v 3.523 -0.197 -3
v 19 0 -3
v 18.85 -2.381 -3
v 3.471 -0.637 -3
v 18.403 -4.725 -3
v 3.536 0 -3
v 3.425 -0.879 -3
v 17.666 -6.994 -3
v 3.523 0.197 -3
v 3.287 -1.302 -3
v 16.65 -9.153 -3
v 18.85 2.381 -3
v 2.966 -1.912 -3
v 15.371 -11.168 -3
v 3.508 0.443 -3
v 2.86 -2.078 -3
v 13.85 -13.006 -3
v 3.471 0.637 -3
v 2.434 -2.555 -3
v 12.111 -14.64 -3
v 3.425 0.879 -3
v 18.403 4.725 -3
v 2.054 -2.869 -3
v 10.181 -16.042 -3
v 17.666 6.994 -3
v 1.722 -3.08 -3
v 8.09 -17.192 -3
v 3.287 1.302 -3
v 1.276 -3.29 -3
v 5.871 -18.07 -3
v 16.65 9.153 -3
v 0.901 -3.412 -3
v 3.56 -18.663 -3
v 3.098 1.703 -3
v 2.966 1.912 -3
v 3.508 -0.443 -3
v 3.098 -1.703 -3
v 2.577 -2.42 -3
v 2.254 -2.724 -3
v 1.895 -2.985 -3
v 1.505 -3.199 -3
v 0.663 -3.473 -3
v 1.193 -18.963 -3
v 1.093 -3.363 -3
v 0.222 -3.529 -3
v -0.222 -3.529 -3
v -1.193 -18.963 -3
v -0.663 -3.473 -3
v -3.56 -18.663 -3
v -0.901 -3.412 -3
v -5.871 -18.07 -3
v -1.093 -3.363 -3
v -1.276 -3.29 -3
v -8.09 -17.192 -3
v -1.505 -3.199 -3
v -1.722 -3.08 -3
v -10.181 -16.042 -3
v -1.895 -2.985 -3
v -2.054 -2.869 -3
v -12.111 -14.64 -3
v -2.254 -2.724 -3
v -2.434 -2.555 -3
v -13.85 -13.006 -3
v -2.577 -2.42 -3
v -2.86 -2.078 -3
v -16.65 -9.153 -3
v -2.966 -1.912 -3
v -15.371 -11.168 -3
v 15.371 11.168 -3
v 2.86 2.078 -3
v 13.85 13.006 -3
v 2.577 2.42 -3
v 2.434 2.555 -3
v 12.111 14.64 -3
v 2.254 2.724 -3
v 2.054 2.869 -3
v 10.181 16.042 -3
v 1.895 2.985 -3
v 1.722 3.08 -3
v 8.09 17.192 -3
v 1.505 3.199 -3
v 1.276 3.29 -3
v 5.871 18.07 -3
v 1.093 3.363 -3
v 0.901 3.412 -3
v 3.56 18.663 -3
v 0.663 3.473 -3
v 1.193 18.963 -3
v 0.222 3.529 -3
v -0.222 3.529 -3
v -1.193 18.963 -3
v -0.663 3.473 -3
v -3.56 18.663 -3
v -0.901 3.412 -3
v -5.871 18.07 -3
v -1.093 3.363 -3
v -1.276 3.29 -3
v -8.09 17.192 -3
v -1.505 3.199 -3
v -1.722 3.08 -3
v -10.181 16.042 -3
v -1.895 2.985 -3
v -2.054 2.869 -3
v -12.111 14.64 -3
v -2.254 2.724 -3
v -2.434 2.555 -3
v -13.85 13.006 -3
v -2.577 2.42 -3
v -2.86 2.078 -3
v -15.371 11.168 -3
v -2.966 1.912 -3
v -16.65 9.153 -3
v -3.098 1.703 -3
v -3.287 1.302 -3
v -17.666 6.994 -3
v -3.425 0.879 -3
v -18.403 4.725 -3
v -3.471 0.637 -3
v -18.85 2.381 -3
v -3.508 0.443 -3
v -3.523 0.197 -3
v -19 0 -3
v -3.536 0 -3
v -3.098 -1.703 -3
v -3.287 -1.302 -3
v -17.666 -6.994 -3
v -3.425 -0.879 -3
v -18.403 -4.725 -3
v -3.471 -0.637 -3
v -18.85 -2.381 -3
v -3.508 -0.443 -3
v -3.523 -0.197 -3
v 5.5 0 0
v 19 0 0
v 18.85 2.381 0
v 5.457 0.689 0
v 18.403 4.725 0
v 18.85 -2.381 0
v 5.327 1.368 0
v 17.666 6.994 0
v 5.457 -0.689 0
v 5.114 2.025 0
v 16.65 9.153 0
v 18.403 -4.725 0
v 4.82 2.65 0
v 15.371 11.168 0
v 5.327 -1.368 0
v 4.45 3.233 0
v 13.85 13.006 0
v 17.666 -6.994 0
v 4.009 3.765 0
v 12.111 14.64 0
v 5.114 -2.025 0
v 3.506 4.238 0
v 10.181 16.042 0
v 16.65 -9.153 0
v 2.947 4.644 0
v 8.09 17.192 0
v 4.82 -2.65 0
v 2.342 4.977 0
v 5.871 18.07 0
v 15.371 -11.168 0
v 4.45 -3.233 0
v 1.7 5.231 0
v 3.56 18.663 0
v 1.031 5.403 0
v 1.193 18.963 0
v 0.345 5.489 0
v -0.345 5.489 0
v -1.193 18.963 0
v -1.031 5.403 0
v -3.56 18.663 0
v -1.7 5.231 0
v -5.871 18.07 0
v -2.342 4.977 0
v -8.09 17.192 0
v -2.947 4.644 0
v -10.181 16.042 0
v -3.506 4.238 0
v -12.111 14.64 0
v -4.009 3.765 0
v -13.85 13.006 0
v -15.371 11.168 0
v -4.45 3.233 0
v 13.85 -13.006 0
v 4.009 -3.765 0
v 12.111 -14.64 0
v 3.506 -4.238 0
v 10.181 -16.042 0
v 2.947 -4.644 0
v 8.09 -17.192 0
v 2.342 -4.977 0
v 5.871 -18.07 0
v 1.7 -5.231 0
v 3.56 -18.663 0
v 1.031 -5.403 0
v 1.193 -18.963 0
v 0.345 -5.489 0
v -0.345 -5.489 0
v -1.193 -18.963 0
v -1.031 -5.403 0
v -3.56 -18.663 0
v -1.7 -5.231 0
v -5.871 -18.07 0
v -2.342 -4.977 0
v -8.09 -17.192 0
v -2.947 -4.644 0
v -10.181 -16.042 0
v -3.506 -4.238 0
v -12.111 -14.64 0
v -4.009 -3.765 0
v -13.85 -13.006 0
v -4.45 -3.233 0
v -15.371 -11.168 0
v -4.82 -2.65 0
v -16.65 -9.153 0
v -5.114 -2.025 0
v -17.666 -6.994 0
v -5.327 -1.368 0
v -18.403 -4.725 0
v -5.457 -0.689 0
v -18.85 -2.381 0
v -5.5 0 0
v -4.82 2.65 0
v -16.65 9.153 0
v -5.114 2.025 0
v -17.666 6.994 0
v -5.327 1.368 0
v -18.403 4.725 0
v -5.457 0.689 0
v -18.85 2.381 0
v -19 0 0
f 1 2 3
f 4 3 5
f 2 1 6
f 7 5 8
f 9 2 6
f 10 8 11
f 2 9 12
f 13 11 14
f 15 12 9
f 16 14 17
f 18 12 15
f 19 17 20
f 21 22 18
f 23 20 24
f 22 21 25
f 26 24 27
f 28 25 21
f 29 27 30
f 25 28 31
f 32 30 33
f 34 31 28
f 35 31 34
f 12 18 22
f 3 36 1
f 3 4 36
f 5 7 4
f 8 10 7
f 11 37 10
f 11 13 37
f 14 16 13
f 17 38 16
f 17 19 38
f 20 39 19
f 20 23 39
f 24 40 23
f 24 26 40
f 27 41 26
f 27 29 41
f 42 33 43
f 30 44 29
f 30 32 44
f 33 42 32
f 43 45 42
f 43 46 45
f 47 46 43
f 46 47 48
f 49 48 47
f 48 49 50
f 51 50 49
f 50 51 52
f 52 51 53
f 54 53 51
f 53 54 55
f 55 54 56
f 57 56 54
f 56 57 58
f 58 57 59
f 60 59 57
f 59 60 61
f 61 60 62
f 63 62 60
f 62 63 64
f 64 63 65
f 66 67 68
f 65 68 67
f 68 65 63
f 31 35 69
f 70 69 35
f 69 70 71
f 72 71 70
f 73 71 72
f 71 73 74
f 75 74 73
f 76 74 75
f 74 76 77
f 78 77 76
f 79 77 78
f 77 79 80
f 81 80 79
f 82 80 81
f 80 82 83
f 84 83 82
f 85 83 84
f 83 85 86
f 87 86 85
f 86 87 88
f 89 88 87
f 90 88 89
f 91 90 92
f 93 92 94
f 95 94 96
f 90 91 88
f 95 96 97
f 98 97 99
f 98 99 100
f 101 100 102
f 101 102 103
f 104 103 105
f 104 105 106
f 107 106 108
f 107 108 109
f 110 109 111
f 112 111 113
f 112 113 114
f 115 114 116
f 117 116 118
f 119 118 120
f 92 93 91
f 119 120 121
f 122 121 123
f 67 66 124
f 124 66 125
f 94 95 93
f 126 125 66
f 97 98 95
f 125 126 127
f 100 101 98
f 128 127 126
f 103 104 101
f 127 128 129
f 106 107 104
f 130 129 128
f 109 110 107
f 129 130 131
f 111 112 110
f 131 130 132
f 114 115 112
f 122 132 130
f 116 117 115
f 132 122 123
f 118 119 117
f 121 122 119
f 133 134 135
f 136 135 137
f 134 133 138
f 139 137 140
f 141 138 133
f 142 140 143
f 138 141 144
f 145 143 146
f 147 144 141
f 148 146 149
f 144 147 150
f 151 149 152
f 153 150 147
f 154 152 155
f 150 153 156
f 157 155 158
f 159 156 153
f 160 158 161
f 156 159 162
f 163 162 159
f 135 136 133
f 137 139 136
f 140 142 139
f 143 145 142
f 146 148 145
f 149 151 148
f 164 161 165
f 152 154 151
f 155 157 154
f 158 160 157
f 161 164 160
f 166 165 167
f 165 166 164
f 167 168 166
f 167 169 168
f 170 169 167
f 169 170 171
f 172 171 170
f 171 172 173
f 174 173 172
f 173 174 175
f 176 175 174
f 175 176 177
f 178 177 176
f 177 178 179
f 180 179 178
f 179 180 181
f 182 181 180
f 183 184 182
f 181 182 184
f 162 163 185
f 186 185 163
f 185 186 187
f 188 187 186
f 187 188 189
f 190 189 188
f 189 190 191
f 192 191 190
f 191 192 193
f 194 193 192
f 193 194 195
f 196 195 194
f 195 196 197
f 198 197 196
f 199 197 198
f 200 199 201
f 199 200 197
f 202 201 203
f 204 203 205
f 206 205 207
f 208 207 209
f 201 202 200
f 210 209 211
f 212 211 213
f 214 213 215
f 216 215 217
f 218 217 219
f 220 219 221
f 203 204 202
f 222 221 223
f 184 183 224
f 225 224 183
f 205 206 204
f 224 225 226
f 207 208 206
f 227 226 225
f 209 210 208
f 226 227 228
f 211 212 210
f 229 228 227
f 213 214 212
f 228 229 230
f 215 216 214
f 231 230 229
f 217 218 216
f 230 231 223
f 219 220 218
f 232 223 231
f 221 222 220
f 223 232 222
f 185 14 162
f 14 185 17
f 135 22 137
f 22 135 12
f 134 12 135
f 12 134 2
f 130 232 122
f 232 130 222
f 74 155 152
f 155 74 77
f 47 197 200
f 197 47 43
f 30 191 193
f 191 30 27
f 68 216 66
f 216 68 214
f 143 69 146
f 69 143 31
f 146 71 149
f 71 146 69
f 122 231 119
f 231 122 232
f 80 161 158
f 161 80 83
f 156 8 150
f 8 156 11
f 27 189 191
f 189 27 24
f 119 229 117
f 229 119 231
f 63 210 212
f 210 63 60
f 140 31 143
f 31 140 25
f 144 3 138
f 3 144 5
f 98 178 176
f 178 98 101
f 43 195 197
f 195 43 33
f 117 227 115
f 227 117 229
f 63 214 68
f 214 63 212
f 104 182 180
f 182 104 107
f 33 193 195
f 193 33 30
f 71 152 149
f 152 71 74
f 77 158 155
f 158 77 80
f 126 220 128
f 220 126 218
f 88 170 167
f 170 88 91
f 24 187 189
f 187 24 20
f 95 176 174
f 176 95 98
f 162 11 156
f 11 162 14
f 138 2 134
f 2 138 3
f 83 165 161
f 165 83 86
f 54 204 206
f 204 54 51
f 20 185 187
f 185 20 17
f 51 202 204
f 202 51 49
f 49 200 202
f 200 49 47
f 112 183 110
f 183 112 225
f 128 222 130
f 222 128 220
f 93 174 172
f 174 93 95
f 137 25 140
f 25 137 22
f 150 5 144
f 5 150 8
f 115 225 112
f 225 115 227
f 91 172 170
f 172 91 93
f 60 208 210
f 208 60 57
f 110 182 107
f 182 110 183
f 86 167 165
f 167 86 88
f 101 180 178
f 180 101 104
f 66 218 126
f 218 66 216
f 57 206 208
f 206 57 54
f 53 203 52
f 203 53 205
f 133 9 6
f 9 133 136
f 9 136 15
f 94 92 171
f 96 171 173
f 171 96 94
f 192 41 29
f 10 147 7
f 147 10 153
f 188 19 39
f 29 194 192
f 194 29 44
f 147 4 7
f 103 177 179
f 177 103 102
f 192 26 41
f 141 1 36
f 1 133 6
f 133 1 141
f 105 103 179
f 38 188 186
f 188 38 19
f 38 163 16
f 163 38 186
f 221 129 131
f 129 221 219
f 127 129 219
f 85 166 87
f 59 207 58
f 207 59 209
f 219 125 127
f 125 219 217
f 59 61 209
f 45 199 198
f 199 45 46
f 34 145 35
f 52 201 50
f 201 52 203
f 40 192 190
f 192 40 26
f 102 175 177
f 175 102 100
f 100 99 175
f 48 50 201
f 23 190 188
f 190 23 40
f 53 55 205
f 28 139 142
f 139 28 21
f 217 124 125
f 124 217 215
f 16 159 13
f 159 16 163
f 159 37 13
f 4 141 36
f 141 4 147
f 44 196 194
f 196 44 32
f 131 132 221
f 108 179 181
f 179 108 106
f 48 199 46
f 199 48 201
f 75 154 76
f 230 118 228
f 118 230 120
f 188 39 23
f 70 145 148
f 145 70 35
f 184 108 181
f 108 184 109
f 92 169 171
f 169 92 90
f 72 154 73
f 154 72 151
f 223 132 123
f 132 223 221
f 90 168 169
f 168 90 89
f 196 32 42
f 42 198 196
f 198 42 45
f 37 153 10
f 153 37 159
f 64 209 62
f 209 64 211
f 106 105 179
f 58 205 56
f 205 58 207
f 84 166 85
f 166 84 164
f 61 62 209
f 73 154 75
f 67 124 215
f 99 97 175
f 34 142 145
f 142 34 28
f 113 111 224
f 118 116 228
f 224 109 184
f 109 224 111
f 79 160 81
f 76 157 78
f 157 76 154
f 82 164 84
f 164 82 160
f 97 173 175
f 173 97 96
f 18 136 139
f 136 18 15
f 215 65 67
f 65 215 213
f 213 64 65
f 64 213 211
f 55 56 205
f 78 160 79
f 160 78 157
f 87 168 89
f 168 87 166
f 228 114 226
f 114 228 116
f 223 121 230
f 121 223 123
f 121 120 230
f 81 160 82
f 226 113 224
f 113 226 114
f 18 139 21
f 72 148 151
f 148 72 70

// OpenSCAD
$fn = 50;


difference() {
	union() {
		translate(v = [0, 0, -3.0000000000]) {
			cylinder(h = 3, r = 10.0000000000);
		}
		translate(v = [0, 0, -3.0000000000]) {
			cylinder(h = 3, r = 19.0000000000);
		}
	}
	union() {
		translate(v = [0, 0, 0]) {
			rotate(a = [0, 0, 0]) {
				difference() {
					union() {
						#translate(v = [0, 0, -3.0000000000]) {
							cylinder(h = 3, r = 2.2500000000);
						}
						#translate(v = [0, 0, -4.2000000000]) {
							cylinder(h = 4.2000000000, r = 10.0000000000, r1 = 2.7500000000, r2 = 5.5000000000);
						}
						#translate(v = [0, 0, -3.0000000000]) {
							cylinder(h = 3, r = 2.7500000000);
						}
						#translate(v = [0, 0, -3.0000000000]) {
							cylinder(h = 3, r = 2.2500000000);
						}
					}
					union();
				}
			}
		}
	}
}
